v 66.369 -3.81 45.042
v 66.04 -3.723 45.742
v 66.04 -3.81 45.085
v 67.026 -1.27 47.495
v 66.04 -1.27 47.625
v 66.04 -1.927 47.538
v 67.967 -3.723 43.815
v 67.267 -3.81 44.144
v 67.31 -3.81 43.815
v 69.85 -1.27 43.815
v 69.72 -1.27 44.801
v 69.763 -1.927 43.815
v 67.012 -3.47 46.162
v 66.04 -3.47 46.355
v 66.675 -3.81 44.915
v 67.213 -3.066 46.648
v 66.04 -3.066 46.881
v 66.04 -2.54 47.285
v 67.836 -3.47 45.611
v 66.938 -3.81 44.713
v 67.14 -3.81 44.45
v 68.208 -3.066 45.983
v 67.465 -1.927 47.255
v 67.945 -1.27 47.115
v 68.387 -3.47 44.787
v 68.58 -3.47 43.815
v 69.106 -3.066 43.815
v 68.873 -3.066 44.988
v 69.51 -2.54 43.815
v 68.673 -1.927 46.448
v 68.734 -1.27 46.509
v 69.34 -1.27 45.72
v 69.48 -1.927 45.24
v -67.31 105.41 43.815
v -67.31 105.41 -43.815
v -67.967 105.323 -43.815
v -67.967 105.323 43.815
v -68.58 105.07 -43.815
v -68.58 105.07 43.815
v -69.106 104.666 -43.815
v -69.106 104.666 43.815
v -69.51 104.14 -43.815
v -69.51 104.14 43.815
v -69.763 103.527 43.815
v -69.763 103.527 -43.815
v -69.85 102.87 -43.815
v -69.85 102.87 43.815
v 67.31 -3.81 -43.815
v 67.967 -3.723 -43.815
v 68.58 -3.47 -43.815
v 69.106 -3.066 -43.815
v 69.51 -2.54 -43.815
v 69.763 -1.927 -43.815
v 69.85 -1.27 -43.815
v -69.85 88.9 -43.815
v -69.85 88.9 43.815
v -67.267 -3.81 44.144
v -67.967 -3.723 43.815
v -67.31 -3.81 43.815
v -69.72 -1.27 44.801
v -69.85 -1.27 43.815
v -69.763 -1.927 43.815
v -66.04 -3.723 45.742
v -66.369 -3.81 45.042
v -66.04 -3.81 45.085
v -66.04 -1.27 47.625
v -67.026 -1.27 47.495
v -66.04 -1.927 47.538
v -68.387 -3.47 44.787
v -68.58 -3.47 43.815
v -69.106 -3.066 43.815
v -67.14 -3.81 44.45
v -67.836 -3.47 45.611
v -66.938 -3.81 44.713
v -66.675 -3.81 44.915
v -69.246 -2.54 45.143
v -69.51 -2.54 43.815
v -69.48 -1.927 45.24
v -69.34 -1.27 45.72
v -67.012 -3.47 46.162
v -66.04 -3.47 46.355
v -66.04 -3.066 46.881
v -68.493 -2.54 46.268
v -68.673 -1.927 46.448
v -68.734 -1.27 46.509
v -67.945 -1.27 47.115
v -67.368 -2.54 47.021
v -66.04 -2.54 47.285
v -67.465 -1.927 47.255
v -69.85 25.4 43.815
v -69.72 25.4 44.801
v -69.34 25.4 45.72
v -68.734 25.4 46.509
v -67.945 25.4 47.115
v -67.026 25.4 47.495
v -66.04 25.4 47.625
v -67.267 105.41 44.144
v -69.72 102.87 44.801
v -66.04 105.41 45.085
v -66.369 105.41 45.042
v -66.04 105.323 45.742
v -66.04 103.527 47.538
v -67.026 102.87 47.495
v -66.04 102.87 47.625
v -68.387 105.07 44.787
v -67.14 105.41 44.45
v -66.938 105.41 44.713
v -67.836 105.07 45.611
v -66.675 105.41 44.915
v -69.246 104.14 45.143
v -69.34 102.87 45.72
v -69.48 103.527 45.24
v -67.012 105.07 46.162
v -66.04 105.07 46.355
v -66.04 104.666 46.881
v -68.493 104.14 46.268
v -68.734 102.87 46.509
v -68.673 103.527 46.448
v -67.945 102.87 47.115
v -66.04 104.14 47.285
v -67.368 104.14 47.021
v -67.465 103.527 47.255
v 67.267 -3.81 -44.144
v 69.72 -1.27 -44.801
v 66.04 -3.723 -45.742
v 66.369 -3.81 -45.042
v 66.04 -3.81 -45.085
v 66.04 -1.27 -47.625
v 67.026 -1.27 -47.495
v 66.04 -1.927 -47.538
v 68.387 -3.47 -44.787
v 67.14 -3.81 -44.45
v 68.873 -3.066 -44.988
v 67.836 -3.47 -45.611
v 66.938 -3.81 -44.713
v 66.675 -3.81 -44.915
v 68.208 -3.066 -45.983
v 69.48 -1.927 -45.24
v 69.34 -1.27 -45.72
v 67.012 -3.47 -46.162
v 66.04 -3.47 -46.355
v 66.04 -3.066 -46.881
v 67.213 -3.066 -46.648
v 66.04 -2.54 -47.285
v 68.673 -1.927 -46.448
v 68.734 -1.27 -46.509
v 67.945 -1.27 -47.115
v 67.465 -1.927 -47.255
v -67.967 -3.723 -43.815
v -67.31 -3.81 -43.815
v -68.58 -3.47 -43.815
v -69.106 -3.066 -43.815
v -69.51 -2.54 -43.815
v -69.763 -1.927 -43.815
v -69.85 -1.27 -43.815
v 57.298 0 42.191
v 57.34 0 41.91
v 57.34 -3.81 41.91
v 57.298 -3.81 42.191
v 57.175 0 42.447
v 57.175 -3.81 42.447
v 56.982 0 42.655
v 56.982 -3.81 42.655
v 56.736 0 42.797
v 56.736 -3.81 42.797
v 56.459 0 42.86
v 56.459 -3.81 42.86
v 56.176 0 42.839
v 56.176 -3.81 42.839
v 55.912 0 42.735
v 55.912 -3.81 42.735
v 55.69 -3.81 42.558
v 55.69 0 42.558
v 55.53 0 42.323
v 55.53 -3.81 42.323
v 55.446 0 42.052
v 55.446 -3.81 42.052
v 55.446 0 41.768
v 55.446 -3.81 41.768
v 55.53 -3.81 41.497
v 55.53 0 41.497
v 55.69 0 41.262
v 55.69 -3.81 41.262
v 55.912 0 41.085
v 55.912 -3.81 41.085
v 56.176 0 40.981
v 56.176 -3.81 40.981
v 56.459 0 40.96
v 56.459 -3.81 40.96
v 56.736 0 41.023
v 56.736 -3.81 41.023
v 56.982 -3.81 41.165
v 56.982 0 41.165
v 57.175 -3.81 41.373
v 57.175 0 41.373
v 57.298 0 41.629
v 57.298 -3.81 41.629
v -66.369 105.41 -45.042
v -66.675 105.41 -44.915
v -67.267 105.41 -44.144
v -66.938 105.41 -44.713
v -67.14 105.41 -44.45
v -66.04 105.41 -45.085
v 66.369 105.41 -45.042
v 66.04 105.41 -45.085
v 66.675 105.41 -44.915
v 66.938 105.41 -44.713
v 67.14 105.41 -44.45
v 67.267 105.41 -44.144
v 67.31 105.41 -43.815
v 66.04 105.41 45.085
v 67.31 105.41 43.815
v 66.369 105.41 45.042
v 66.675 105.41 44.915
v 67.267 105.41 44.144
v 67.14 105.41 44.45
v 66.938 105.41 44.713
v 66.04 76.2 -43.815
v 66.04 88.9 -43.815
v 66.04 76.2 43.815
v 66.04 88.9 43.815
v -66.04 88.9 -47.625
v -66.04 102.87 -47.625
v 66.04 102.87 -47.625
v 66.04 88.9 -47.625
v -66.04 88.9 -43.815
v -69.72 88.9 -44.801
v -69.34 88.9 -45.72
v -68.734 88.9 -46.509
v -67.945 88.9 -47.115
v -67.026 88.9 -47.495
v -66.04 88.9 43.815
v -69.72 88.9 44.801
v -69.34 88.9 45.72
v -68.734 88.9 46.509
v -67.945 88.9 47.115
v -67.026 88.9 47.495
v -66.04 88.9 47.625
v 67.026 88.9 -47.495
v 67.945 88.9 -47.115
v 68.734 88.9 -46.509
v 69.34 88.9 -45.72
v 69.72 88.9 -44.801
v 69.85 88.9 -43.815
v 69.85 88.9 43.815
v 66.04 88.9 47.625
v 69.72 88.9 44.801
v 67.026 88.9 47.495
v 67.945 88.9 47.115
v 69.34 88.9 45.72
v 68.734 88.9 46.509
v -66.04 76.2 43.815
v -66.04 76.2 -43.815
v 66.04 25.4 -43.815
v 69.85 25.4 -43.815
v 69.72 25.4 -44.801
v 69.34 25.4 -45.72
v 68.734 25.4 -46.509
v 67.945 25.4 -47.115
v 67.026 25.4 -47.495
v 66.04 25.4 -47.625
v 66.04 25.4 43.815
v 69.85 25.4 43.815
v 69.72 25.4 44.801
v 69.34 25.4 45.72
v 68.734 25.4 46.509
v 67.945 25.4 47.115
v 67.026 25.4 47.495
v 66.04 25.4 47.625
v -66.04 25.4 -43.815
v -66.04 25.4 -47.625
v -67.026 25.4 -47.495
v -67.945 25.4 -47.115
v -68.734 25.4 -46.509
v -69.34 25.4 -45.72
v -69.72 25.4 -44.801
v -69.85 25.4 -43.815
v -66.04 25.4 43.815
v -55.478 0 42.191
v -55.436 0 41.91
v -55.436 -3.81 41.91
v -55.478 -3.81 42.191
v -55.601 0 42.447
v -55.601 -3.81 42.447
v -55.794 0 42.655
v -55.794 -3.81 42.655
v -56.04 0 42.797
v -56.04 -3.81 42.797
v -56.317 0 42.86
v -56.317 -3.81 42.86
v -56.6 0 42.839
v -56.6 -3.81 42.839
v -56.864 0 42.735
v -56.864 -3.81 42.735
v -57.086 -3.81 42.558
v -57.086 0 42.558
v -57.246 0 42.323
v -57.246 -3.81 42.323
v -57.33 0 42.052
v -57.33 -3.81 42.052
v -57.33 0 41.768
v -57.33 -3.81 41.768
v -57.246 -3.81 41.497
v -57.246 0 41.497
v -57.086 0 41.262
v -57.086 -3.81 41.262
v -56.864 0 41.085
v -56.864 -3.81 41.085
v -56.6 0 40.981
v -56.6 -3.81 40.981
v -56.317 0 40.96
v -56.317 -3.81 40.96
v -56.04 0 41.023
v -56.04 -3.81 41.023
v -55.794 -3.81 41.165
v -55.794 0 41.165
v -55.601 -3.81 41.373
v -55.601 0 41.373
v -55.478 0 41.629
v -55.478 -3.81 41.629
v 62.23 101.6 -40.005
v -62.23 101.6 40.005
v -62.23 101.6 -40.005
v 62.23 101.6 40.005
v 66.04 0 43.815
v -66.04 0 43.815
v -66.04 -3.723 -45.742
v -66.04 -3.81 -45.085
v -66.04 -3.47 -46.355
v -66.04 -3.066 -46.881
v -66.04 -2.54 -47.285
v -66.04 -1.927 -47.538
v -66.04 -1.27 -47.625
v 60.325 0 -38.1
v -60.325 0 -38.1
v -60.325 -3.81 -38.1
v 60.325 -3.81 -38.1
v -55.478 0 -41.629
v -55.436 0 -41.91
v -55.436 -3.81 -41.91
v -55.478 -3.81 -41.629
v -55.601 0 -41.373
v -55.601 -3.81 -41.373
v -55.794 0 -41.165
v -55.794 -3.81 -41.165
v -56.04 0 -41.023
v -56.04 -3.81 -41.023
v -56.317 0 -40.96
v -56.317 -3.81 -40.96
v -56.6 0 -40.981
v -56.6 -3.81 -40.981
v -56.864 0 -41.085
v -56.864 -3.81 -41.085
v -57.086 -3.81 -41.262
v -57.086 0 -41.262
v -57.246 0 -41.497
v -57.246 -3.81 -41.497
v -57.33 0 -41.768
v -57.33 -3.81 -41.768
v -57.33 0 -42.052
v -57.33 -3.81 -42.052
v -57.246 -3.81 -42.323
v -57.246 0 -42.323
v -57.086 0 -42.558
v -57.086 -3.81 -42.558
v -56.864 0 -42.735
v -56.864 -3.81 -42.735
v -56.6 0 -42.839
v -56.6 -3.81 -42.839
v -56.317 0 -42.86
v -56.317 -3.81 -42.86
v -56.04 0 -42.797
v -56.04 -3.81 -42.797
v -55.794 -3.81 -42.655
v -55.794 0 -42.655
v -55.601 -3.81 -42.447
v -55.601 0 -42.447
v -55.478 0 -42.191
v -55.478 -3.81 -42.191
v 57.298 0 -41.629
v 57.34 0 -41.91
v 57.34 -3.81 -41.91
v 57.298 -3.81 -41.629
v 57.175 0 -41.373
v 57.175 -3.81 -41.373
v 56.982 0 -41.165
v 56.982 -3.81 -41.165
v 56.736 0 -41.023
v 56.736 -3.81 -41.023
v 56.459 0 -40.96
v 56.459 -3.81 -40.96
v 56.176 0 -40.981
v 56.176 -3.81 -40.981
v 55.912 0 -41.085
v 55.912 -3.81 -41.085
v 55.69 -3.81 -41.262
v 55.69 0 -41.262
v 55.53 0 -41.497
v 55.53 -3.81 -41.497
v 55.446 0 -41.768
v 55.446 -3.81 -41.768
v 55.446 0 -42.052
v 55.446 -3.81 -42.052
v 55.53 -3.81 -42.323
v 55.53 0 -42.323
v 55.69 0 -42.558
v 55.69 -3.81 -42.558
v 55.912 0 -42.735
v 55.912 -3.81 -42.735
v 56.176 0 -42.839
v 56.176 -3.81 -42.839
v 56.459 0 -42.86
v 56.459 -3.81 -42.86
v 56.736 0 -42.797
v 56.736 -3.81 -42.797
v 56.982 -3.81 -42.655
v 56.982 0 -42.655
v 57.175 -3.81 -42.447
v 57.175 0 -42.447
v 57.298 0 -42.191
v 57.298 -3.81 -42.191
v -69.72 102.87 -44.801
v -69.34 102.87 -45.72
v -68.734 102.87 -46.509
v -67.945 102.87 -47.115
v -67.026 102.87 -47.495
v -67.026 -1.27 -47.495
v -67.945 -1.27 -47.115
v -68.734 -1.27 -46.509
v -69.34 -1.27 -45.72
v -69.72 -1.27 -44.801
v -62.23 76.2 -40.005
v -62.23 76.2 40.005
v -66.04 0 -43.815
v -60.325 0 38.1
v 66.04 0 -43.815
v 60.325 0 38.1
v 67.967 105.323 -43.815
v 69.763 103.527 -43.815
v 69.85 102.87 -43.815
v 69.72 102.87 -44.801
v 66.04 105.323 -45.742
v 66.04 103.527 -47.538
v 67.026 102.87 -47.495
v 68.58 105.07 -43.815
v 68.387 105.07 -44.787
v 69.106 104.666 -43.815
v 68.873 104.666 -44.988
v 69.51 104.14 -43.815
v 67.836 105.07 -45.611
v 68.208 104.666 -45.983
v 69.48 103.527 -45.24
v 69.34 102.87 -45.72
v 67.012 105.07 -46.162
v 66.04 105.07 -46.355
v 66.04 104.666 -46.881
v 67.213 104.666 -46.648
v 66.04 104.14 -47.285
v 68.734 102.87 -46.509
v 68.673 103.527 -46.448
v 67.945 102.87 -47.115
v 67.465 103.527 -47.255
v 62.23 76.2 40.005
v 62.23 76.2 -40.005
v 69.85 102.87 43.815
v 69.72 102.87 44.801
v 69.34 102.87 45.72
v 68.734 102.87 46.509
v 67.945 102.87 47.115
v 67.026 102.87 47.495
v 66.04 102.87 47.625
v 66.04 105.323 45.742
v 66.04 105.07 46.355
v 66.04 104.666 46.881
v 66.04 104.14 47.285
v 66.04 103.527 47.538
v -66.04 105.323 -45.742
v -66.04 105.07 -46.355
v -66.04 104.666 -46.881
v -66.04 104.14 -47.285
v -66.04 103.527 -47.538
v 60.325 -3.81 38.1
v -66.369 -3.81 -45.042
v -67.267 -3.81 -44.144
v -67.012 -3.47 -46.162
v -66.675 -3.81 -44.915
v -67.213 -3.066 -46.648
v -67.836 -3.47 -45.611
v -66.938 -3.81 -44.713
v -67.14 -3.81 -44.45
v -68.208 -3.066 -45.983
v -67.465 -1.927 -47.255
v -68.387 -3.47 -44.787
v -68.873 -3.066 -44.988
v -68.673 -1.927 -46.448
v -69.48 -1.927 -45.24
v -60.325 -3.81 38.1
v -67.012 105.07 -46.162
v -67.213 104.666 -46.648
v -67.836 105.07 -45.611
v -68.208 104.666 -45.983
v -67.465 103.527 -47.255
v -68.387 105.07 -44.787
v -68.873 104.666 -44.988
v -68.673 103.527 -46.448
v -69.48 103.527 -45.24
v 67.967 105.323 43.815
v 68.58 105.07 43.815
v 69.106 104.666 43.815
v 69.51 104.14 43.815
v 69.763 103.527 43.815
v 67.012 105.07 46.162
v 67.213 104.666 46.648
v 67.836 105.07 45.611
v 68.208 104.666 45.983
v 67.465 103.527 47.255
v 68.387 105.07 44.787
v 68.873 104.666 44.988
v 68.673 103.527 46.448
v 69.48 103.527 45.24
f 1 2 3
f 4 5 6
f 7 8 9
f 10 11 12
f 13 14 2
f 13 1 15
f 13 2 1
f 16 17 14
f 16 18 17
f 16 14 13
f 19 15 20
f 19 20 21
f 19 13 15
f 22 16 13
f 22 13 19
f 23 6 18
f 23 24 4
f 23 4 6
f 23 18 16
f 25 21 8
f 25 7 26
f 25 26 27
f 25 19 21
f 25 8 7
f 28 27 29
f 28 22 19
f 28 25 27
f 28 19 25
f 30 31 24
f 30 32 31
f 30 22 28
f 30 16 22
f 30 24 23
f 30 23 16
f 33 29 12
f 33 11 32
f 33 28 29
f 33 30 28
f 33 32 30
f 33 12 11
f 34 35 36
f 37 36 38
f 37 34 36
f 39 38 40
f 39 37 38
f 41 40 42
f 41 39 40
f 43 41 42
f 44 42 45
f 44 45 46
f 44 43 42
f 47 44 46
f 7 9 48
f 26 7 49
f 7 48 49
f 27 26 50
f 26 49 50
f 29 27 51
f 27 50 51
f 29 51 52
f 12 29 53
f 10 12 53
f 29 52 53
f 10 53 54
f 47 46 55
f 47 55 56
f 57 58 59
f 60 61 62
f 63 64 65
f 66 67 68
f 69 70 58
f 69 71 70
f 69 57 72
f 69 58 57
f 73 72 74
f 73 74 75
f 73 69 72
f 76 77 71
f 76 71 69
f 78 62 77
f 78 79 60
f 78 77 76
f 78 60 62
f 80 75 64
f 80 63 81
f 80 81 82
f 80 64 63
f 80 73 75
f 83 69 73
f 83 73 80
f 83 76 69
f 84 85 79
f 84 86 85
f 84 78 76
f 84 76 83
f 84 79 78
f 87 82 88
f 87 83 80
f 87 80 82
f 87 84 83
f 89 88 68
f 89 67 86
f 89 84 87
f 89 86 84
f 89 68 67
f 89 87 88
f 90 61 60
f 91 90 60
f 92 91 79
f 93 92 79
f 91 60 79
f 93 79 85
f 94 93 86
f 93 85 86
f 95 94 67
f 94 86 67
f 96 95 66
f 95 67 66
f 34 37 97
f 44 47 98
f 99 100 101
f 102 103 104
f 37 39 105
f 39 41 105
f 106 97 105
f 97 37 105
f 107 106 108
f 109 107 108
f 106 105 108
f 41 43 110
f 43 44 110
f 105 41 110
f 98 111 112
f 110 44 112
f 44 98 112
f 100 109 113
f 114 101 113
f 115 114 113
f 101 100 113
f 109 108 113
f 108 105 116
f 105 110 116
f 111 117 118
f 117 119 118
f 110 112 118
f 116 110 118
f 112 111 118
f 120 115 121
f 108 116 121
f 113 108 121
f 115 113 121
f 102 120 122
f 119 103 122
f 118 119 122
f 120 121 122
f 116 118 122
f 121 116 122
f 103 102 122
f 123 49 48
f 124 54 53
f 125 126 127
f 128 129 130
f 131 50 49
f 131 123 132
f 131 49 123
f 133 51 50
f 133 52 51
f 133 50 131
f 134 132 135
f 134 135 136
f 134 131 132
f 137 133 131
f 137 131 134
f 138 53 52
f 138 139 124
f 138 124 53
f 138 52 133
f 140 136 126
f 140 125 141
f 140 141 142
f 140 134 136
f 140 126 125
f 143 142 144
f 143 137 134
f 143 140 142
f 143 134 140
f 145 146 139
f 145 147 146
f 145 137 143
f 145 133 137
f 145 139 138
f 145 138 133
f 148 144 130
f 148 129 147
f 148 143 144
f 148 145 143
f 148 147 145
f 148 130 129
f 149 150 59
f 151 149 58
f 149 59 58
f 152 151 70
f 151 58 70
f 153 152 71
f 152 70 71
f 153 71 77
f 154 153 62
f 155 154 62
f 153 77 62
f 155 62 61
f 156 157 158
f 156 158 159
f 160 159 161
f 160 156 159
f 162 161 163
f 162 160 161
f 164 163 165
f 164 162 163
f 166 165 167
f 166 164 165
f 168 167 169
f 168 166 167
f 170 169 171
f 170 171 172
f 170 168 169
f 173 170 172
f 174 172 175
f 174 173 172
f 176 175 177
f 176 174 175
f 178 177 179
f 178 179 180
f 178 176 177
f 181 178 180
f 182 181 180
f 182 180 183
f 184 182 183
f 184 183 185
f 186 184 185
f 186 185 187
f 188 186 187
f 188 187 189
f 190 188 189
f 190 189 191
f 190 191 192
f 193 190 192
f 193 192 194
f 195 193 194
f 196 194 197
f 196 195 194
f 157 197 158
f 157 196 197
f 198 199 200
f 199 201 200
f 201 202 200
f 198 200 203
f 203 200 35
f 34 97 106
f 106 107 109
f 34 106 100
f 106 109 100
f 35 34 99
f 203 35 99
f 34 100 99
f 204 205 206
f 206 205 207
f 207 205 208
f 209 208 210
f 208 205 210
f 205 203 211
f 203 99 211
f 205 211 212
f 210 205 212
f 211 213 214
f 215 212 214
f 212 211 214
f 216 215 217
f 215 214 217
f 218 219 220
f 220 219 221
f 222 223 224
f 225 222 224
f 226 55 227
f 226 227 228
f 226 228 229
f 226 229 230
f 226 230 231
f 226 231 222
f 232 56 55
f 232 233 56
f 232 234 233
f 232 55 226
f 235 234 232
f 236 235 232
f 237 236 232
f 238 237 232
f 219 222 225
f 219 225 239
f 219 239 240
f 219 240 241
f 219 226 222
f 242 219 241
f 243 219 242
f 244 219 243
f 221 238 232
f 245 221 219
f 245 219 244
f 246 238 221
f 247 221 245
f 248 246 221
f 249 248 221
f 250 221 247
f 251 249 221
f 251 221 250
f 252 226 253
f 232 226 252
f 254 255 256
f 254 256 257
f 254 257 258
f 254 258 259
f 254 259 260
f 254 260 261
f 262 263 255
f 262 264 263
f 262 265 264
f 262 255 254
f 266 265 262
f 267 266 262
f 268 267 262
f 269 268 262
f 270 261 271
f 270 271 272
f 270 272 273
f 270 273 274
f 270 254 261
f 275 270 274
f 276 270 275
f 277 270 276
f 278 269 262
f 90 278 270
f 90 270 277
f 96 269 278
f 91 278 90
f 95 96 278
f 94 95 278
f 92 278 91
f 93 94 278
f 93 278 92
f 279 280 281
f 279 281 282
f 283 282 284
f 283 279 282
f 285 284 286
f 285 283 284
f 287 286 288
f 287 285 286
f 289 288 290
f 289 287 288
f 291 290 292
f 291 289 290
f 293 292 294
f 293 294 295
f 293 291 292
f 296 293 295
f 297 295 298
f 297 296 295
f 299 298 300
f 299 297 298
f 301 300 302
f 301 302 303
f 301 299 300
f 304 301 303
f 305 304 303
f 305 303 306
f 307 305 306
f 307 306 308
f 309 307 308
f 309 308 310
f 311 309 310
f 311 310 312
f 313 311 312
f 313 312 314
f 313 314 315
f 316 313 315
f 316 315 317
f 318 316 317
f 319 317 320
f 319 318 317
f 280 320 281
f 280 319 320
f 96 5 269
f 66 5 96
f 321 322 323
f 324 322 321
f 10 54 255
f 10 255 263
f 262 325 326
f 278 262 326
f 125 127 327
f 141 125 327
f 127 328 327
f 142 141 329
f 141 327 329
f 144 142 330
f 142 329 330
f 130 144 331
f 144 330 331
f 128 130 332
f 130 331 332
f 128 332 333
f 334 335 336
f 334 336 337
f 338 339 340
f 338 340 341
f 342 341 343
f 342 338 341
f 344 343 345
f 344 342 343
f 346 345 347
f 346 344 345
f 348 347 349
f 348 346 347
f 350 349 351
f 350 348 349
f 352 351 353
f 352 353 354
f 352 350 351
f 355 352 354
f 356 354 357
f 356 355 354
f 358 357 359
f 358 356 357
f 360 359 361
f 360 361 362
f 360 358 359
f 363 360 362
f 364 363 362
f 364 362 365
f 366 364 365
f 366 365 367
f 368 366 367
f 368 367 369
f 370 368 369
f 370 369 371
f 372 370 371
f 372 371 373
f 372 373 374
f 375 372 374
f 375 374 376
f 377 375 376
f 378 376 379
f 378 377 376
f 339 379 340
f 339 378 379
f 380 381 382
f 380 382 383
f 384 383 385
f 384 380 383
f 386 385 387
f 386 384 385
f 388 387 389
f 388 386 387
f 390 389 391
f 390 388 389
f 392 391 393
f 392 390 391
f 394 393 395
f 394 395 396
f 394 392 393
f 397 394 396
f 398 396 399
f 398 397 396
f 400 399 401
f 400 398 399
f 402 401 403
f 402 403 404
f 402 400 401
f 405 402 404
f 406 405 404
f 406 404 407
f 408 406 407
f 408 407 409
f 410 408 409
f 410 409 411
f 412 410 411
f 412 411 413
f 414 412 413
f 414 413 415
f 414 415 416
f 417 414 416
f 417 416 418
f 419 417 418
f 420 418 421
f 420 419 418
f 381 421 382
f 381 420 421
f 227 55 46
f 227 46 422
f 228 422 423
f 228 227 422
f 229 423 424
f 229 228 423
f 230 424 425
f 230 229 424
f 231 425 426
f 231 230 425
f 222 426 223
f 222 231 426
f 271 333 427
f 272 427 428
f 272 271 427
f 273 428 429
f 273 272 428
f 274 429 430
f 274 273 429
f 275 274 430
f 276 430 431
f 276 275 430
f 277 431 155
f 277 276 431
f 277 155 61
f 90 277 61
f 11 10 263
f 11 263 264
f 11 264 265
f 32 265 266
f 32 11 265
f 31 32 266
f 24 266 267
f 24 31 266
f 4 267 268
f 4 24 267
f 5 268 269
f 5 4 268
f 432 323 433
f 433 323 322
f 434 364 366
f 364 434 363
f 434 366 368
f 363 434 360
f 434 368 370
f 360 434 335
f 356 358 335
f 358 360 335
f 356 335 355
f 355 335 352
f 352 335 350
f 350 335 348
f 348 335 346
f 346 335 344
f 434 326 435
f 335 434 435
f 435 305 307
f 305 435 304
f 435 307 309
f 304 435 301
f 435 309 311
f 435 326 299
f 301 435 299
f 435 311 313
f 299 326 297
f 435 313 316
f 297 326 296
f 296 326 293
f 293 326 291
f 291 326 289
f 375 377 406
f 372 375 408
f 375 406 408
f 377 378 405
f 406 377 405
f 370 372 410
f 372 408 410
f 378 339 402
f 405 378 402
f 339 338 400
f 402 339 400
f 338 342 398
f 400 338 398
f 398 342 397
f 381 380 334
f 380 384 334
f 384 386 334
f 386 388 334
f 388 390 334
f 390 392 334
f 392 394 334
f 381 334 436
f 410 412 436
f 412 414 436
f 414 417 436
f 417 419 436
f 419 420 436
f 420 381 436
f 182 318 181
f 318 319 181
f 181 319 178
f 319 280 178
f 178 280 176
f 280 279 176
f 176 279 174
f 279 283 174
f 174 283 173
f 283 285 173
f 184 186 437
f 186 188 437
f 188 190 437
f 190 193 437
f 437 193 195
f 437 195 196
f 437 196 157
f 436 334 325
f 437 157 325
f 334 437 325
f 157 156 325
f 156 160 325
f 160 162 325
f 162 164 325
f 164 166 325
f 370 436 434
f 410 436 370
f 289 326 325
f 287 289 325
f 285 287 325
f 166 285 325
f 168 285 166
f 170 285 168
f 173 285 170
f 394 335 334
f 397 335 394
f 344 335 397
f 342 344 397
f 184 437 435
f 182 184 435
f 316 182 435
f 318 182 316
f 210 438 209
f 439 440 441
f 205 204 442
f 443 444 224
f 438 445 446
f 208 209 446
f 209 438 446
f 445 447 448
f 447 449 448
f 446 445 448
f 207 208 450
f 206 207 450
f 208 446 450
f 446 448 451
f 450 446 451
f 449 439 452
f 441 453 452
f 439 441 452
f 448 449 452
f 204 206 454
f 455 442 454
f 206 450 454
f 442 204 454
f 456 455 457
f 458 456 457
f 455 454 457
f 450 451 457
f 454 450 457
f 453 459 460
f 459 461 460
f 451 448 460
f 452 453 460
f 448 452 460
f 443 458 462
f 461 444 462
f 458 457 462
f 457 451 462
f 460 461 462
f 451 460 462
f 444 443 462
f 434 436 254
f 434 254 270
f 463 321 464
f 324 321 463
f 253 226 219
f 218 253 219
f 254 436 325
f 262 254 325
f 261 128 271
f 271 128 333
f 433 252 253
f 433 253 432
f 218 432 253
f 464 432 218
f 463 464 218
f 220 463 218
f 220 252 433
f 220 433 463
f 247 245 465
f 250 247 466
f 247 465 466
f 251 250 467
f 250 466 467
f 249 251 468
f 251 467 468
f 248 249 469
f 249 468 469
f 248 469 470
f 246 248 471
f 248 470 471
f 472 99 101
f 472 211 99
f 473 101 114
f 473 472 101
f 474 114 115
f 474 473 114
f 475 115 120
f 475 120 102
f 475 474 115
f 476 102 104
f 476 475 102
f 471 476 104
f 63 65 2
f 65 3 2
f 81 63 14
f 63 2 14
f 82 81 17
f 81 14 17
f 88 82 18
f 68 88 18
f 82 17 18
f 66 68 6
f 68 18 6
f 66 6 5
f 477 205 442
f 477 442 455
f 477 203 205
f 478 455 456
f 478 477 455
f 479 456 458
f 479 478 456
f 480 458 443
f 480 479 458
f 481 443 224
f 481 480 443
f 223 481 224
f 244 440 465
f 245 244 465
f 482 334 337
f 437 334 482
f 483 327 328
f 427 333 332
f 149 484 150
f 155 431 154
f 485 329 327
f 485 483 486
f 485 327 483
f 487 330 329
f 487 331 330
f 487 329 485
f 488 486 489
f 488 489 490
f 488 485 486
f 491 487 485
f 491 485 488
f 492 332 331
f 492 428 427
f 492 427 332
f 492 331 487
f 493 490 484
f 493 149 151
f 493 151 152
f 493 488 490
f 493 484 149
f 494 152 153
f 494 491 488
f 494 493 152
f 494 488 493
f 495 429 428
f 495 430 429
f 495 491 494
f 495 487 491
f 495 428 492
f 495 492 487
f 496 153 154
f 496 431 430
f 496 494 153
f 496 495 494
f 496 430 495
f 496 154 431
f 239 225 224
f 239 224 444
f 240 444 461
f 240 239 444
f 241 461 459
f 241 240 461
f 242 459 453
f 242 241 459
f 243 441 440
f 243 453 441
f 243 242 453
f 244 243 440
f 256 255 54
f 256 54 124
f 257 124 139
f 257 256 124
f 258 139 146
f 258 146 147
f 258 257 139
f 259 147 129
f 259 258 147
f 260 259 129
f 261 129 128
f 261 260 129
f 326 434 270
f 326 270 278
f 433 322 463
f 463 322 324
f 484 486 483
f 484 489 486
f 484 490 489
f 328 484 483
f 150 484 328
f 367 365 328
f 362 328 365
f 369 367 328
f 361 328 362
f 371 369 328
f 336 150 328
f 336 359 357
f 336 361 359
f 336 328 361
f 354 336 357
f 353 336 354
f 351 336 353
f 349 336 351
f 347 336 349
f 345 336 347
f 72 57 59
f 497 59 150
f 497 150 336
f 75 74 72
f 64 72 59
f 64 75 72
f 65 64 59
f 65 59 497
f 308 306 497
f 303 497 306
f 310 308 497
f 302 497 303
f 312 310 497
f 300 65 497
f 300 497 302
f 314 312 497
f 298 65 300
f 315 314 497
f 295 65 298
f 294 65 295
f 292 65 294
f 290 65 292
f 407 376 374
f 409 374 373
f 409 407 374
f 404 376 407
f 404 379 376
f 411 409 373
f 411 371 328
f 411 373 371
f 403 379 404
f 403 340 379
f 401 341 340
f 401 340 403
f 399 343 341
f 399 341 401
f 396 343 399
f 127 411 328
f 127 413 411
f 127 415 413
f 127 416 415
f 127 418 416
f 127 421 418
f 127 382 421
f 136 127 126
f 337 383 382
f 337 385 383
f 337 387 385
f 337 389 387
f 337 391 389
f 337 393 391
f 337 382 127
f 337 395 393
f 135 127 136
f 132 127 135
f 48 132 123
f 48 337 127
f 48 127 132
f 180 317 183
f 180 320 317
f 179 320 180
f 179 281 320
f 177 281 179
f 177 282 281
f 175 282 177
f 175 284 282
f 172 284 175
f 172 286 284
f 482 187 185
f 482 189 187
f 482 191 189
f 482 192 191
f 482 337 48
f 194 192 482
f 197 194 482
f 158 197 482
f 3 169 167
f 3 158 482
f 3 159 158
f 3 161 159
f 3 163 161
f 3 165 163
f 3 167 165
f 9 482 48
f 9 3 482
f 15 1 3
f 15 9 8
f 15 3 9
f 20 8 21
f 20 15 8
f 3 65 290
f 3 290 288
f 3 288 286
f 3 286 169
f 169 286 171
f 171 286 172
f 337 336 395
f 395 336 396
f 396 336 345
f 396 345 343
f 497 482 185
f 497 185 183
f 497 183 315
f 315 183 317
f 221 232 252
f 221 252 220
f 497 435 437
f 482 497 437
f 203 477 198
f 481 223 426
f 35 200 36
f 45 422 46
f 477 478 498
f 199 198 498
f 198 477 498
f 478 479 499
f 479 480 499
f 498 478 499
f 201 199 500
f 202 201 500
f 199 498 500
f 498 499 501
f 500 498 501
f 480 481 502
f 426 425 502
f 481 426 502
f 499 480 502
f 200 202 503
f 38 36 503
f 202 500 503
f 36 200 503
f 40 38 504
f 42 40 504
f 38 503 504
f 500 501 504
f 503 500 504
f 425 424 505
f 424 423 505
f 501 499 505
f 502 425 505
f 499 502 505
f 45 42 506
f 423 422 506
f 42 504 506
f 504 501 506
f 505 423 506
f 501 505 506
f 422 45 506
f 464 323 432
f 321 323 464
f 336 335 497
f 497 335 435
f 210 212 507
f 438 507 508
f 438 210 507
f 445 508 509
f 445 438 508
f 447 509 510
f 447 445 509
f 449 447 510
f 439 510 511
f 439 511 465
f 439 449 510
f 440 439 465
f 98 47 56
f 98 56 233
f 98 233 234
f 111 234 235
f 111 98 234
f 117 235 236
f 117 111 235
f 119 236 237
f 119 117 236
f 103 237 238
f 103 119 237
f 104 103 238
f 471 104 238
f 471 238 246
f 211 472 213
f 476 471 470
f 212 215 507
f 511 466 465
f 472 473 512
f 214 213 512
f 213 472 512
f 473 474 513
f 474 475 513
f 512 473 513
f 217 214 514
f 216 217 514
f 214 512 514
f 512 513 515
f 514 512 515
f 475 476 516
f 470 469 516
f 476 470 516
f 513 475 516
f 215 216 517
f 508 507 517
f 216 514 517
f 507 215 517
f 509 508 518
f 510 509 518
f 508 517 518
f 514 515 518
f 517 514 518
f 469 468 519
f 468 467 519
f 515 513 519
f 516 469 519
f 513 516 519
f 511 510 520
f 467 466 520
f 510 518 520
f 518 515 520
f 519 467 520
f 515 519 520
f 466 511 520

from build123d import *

# Parameters (mm, degrees)
F0_W      = 139.7
F0_H      = 95.25
F0_R      = 0.9525
F0_W_2    = 120.65
F0_H_2    = 76.2
F1_DEPTH  = 3.81
F2_W      = 139.7
F2_H      = 95.25
F2_W_2    = 132.08
F2_H_2    = 87.63
F3_DEPTH  = 25.4
F4_R      = 3.81
F5_R      = 2.54
F7_W      = 139.7
F7_H      = 95.25
F7_W_2    = 132.08
F7_H_2    = 87.63
F8_DEPTH  = 3.81
F9_DEPTH  = 12.7
F10_R     = 3.81
F11_R     = 2.54
F12_W     = 132.08
F12_H     = 87.63
F12_W_2   = 124.46
F12_H_2   = 80.01
F13_DEPTH = 25.4


with BuildPart() as f1:
    # F0 (on Front) → F1 (new body)
    with BuildSketch(Plane.XZ):
        Rectangle(F0_W, F0_H)
        with Locations((-56.388, -41.91)):
            Circle(F0_R, mode=Mode.SUBTRACT)
        with Locations((56.388, -41.91)):
            Circle(F0_R, mode=Mode.SUBTRACT)
        with Locations((-56.388, 41.91)):
            Circle(F0_R, mode=Mode.SUBTRACT)
        Rectangle(F0_W_2, F0_H_2, mode=Mode.SUBTRACT)
        with Locations((56.388, 41.91)):
            Circle(F0_R, mode=Mode.SUBTRACT)
    extrude(amount=F1_DEPTH)

    # F2 (on face) → F3 (join)
    with BuildSketch(Plane(origin=(0, 0, 0), x_dir=(-1, 0, 0), z_dir=(0, 1, 0))):
        Rectangle(F2_W, F2_H)
        Rectangle(F2_W_2, F2_H_2, mode=Mode.SUBTRACT)
    extrude(amount=F3_DEPTH)

    # F4
    f4_edges = [f1.edges().sort_by_distance(p)[0] for p in [
        (69.85, 10.795, 47.625),
        (-69.85, 10.795, 47.625),
        (69.85, 10.795, -47.625),
        (-69.85, 10.795, -47.625),
    ]]
    fillet(f4_edges, radius=F4_R)

    # F5
    f5_edges = [f1.edges().sort_by_distance(p)[0] for p in [
        (0, -3.81, 47.625),
        (69.85, -3.81, 0),
    ]]
    fillet(f5_edges, radius=F5_R)


with BuildPart() as f8:
    # F7 (on offset) → F8 (new body)
    with BuildSketch(Plane.XZ.offset(-101.6)):
        Rectangle(F7_W, F7_H)
        Rectangle(F7_W_2, F7_H_2, mode=Mode.SUBTRACT)
        Rectangle(F7_W_2, F7_H_2)
    extrude(amount=-F8_DEPTH)

    # F7 (on offset) → F9 (join)
    with BuildSketch(Plane.XZ.offset(-101.6)):
        Rectangle(F7_W, F7_H)
        Rectangle(F7_W_2, F7_H_2, mode=Mode.SUBTRACT)
    extrude(amount=F9_DEPTH)

    # F10
    f10_edges = [f8.edges().sort_by_distance(p)[0] for p in [
        (69.85, 97.155, 47.625),
        (-69.85, 97.155, 47.625),
        (69.85, 97.155, -47.625),
        (-69.85, 97.155, -47.625),
    ]]
    fillet(f10_edges, radius=F10_R)

    # F11
    f11_edges = [f8.edges().sort_by_distance(p)[0] for p in [
        (0, 105.41, 47.625),
    ]]
    fillet(f11_edges, radius=F11_R)

    # F12 (on face) → F13 (join)
    with BuildSketch(Plane.XZ.offset(-101.6)):
        Rectangle(F12_W, F12_H)
        Rectangle(F12_W_2, F12_H_2, mode=Mode.SUBTRACT)
    extrude(amount=F13_DEPTH)


solid = Compound([f1.part, f8.part])
